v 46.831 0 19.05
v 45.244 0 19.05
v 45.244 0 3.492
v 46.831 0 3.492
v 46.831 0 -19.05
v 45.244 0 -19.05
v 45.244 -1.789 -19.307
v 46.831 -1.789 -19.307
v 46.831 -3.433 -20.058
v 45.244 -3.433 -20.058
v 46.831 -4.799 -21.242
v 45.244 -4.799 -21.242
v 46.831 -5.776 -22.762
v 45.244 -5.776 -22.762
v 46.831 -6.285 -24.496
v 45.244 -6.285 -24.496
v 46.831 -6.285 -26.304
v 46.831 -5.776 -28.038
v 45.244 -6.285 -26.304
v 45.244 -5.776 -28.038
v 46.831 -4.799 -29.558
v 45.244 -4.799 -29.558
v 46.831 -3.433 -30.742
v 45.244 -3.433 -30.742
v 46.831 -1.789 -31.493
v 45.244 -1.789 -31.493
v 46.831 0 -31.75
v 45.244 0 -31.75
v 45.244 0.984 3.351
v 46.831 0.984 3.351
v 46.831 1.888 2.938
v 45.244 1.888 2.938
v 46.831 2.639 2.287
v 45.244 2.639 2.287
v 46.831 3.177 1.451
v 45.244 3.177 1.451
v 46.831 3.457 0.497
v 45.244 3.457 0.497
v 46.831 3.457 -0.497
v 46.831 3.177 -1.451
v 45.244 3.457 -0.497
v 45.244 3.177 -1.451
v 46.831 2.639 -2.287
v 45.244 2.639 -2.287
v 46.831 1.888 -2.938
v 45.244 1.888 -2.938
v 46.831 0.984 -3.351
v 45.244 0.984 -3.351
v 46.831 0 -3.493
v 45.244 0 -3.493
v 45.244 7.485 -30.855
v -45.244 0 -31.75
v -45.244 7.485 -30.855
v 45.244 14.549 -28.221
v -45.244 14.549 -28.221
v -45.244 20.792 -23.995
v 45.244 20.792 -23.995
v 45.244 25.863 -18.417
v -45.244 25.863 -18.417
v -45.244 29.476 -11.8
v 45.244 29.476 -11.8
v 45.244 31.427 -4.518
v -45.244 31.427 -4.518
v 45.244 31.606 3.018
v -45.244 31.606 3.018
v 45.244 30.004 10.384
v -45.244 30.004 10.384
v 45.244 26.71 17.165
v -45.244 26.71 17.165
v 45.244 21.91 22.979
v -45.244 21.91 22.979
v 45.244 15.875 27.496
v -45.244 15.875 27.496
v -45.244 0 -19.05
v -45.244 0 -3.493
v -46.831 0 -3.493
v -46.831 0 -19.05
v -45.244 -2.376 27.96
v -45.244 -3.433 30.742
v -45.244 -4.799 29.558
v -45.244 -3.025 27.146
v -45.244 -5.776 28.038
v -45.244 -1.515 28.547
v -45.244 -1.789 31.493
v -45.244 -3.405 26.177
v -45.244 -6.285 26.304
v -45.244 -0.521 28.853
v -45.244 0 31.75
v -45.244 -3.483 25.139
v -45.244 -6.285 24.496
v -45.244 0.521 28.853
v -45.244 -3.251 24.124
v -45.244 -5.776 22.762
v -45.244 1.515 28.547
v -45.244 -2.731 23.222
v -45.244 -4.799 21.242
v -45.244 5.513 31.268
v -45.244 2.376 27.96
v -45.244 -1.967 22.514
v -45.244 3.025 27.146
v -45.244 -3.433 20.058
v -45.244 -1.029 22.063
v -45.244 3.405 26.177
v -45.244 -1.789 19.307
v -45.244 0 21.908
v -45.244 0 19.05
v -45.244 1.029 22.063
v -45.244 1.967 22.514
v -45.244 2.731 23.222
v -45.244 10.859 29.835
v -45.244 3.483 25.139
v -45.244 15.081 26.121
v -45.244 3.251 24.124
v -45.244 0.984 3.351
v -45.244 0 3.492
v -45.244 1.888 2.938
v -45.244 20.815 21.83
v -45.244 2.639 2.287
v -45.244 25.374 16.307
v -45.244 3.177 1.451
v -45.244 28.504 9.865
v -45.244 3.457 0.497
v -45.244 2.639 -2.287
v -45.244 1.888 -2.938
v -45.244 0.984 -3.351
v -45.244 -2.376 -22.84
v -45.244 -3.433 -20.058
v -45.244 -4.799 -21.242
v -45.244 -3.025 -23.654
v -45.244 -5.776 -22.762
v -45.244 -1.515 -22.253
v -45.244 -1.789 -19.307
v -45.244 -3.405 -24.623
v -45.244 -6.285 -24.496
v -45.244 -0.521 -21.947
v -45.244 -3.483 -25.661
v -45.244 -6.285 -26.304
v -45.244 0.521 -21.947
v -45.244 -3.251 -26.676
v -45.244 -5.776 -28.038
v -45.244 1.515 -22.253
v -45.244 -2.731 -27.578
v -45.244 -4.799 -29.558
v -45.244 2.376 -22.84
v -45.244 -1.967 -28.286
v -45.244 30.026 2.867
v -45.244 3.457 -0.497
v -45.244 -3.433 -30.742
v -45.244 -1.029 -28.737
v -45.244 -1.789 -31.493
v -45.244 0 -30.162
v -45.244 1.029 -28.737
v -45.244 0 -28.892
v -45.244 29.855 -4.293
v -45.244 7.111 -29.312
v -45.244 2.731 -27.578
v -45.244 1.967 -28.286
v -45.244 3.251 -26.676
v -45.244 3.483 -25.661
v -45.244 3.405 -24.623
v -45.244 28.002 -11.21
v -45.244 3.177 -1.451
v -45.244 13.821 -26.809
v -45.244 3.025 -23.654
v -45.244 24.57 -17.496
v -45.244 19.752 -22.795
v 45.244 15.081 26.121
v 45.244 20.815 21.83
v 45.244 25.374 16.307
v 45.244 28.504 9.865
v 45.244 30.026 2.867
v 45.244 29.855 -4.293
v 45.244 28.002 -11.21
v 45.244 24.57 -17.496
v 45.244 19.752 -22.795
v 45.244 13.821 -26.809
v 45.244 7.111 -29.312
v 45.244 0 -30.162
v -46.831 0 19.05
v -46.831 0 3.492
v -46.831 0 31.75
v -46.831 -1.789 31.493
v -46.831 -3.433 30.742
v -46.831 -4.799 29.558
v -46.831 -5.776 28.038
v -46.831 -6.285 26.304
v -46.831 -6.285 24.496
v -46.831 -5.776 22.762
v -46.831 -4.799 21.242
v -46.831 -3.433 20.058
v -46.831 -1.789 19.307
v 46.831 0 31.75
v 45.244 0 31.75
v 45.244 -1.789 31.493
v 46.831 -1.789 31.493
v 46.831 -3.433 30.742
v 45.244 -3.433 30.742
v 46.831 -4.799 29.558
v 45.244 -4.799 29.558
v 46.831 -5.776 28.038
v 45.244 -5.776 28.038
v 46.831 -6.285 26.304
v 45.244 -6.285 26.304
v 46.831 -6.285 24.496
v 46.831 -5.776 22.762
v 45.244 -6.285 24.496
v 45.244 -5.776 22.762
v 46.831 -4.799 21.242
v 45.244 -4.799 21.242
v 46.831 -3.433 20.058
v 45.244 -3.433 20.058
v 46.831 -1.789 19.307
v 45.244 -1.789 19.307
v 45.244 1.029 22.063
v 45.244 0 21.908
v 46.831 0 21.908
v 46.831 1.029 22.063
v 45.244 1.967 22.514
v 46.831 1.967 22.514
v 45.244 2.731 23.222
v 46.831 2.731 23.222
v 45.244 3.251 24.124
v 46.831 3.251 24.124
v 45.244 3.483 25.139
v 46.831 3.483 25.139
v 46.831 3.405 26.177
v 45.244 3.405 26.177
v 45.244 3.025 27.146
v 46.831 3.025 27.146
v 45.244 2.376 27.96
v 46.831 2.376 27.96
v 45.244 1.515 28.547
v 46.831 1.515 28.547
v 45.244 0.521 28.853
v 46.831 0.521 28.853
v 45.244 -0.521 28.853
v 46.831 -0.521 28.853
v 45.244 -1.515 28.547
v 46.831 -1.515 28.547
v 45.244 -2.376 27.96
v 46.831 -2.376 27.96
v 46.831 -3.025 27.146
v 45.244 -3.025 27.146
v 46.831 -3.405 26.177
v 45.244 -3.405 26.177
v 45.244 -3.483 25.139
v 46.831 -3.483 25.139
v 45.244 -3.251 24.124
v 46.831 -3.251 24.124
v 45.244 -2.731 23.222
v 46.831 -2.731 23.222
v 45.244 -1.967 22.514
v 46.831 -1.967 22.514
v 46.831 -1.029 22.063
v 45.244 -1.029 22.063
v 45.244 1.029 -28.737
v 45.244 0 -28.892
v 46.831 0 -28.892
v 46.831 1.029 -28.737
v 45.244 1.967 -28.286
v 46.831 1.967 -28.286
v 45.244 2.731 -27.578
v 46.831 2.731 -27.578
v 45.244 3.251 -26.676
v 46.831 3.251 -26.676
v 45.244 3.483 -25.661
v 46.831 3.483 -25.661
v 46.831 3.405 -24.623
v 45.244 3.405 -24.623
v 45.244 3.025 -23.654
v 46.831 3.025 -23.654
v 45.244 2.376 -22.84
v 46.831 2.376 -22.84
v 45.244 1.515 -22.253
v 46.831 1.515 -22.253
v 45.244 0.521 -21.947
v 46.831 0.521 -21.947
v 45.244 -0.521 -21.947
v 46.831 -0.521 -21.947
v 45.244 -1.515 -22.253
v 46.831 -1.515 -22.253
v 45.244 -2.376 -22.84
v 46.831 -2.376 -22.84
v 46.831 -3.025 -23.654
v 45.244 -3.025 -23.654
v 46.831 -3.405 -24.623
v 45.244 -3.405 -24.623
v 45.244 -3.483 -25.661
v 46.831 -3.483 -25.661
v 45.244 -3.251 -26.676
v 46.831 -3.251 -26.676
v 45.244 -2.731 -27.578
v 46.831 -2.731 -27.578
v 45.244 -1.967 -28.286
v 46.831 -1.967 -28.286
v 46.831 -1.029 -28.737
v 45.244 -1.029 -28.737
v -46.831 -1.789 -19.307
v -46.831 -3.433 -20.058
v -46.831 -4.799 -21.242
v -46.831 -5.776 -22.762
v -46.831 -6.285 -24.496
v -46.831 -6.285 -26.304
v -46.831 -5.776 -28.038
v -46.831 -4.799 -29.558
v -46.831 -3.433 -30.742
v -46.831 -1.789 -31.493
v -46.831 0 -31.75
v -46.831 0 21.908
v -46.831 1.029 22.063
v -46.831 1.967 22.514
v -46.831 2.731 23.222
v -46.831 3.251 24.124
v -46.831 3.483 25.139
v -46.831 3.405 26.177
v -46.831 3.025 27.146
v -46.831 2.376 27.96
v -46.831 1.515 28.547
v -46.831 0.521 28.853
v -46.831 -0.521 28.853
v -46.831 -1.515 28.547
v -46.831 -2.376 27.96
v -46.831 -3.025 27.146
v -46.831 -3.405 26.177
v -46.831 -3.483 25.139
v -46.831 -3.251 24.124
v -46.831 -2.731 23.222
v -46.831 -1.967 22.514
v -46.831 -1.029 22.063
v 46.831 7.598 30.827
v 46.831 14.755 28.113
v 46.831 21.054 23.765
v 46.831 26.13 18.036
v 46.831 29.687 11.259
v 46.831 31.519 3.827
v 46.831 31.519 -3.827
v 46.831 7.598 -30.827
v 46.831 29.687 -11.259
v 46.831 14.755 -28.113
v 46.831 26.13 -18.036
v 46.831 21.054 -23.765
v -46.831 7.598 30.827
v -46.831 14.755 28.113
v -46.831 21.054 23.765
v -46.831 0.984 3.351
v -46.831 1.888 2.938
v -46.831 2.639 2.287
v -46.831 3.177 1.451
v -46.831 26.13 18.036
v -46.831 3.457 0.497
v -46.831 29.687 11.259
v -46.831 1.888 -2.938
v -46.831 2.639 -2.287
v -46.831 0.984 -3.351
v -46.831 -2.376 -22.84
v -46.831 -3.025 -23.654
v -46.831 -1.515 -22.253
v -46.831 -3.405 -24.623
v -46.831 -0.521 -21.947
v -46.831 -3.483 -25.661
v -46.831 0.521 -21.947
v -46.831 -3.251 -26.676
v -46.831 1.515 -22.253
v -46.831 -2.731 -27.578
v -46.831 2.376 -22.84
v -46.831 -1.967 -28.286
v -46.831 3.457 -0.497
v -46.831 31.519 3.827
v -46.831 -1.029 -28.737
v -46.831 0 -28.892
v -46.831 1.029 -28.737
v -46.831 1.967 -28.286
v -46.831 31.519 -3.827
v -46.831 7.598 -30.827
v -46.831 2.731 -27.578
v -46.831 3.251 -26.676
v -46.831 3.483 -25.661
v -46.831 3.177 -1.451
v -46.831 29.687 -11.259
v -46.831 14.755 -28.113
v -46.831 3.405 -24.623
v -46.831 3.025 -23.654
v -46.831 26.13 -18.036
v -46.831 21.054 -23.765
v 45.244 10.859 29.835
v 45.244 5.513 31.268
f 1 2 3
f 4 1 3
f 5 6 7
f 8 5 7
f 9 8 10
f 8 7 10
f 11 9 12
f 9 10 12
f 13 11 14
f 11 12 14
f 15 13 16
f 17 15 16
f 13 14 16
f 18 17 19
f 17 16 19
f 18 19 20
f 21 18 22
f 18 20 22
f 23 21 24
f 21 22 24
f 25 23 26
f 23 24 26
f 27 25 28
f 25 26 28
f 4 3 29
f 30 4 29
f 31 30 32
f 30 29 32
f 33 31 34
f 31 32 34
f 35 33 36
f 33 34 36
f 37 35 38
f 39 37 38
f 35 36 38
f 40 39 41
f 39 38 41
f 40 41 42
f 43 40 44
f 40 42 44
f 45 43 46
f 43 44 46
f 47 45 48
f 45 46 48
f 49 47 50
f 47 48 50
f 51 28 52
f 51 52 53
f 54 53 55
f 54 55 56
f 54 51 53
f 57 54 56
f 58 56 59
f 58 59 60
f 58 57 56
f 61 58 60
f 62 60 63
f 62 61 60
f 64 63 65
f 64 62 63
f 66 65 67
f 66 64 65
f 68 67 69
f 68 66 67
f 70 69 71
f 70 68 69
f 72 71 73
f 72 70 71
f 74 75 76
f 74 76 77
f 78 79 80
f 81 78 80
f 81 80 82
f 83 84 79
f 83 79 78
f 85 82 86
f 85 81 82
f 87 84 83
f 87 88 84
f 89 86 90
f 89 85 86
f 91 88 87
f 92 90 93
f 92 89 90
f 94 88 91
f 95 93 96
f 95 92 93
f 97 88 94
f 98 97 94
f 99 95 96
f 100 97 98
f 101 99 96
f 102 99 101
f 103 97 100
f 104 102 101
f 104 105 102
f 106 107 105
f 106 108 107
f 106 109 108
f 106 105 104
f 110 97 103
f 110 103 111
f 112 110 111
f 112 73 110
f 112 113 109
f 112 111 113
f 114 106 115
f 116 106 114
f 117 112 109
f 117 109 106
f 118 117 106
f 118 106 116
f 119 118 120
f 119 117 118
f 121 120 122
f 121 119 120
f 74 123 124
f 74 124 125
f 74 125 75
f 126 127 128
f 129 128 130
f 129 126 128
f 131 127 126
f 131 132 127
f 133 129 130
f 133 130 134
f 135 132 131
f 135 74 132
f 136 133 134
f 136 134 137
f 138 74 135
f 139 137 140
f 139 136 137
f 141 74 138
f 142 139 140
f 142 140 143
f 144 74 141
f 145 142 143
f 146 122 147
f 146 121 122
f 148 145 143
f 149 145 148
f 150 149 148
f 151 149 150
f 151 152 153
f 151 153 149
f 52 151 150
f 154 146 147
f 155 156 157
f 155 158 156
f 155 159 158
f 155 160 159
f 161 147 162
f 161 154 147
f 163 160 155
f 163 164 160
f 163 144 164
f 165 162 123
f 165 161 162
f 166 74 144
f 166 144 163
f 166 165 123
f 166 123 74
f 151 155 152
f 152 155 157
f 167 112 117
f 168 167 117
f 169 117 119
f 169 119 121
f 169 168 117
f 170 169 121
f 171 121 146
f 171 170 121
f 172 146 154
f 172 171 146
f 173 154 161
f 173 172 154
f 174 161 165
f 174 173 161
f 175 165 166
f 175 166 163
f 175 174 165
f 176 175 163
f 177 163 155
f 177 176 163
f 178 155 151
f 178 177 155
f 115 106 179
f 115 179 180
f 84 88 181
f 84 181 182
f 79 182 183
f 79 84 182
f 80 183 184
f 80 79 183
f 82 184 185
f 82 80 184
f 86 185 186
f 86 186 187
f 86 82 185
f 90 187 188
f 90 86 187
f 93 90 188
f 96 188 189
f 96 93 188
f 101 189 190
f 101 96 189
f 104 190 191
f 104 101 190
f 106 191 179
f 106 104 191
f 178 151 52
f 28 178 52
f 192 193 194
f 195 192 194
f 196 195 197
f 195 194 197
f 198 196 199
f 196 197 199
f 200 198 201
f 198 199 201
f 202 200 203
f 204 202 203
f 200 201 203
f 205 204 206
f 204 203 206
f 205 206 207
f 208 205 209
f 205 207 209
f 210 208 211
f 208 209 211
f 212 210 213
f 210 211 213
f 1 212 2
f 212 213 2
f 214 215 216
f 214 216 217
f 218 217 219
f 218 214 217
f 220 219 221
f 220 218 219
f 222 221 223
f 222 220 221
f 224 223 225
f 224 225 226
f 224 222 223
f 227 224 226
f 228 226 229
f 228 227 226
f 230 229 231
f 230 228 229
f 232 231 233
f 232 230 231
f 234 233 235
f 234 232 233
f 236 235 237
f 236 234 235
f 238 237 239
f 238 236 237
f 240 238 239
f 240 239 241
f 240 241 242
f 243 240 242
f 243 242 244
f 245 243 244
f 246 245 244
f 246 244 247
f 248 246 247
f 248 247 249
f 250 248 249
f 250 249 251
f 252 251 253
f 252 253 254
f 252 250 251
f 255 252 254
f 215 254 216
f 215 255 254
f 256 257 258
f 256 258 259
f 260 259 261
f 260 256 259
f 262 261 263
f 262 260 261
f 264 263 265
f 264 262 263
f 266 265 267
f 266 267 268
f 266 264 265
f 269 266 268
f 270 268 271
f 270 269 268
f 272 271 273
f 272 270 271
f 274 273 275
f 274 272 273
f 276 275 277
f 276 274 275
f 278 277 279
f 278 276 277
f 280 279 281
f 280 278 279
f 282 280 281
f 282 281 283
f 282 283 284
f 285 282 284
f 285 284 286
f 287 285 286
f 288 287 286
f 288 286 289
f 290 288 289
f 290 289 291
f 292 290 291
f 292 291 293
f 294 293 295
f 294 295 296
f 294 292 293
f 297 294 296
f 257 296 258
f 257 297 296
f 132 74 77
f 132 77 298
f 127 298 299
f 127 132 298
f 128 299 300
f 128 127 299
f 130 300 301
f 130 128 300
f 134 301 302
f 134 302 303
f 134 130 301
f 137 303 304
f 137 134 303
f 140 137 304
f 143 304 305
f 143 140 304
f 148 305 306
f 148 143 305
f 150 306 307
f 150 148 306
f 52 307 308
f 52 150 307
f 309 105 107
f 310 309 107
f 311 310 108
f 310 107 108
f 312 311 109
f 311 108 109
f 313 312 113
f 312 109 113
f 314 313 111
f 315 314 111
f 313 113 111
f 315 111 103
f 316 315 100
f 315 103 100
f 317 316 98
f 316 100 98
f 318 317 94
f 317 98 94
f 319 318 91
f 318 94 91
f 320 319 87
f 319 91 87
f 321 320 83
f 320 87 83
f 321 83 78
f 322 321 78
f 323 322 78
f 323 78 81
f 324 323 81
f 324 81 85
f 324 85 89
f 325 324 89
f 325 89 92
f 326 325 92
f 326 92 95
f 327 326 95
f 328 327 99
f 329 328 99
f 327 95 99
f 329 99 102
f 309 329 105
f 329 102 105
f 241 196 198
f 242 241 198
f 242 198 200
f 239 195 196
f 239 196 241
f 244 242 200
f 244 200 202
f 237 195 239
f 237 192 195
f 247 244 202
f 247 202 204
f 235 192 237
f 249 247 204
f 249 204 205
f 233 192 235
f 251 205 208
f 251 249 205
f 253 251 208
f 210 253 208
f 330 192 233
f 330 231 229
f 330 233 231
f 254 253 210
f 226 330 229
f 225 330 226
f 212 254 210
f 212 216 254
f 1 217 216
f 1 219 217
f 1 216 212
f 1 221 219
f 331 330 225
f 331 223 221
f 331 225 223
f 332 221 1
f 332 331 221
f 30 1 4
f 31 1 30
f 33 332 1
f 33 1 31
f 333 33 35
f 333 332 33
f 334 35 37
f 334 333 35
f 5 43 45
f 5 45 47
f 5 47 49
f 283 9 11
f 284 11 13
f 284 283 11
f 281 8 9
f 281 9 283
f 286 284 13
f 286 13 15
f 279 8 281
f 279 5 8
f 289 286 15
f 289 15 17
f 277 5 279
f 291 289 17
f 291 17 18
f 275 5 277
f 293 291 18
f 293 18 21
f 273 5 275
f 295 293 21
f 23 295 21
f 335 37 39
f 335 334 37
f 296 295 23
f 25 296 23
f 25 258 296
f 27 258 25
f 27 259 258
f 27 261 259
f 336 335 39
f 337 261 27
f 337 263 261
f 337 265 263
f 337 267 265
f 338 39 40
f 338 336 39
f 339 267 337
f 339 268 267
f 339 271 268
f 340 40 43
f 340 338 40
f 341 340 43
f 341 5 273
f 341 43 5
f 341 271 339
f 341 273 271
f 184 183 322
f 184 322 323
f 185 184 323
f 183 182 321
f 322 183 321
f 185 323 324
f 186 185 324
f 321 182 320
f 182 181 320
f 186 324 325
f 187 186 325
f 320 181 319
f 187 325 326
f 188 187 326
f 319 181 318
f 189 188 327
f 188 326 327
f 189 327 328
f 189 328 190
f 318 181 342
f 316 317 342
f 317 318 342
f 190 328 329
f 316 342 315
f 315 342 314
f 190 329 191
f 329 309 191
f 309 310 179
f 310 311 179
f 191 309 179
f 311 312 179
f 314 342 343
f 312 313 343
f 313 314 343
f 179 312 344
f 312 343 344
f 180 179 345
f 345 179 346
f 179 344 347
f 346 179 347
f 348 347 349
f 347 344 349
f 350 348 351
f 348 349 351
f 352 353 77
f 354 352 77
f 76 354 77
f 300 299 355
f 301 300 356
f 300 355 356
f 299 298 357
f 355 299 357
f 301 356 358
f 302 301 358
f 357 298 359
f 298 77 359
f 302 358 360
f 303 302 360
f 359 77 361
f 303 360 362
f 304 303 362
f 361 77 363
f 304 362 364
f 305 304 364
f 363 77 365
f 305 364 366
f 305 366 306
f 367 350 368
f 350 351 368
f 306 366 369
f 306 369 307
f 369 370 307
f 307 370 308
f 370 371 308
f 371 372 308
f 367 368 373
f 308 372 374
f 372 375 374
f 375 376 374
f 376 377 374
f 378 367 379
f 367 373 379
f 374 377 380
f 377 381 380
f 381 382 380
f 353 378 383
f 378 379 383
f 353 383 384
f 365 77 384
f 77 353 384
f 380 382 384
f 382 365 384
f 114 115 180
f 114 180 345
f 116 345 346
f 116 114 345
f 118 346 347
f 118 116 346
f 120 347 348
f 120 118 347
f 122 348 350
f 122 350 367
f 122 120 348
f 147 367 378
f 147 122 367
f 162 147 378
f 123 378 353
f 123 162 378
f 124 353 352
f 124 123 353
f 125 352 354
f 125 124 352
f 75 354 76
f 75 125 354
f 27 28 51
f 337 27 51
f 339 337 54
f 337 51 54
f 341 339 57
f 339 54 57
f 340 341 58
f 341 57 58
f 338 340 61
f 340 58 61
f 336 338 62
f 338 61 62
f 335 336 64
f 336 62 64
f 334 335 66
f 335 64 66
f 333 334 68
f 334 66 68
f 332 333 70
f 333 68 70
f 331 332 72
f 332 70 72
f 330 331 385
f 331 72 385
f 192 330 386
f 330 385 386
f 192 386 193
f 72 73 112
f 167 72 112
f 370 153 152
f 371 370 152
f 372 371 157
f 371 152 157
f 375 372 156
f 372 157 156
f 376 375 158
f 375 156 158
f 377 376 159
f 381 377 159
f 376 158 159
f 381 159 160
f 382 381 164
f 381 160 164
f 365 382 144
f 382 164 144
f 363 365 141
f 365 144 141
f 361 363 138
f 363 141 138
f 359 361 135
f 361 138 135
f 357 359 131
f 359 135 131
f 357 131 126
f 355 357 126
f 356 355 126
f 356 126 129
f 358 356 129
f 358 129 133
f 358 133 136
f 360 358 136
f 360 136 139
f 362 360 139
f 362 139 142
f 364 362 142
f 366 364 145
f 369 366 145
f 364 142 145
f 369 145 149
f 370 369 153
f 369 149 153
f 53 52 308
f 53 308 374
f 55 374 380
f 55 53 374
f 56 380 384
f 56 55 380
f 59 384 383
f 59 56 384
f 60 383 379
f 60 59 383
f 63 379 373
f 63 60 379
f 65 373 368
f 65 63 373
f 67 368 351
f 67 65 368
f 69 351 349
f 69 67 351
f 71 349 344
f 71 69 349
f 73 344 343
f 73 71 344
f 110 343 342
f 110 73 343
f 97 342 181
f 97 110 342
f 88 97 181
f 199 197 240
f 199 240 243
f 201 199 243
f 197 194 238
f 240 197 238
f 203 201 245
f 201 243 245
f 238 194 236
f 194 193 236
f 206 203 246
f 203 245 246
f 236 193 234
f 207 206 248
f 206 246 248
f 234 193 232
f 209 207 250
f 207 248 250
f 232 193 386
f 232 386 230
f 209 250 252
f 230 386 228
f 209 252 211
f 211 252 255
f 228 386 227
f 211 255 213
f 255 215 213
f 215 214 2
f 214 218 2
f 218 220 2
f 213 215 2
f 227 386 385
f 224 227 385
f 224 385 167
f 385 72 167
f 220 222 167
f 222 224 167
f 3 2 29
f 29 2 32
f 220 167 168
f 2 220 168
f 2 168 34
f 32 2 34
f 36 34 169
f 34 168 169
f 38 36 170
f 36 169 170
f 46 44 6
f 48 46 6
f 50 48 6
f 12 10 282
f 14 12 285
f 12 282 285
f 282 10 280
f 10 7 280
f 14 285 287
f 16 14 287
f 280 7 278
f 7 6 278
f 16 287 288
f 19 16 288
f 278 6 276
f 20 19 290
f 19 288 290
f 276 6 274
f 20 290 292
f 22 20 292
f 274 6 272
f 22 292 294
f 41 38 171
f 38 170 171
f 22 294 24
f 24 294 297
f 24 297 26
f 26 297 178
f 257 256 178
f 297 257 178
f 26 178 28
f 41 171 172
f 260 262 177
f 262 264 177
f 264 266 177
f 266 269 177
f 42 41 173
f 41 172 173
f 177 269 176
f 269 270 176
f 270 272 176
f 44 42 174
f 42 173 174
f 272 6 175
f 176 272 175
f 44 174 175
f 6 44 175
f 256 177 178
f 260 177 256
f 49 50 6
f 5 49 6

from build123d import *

# Parameters (mm, degrees)
BOSS_EXTRUDE1_DEPTH = 45.24375
SKETCH2_R           = 3.4925
BOSS_EXTRUDE2_DEPTH = 1.5875


with BuildPart() as part:
    # Sketch1 → Boss-Extrude1 (new body, symmetric)
    with BuildSketch(Plane(origin=(0, 0, 0), x_dir=(0, 0, -1), z_dir=(1, 0, 0))):
        with BuildLine():
            ThreePointArc((-26.121491242, 15.08125), (7.806629448, 29.134737735), (30.1625, 0))
            Line((30.1625, 0), (31.75, 0))
            ThreePointArc((31.75, 0), (8.217504682, 30.668144985), (-27.49630657, 15.875))
            Line((-27.49630657, 15.875), (-26.121491242, 15.08125))
        make_face()
    extrude(amount=BOSS_EXTRUDE1_DEPTH, both=True)

    # Sketch2 → Boss-Extrude2 (add)
    with BuildSketch(Plane(origin=(45.24375, 0, 0), x_dir=(0, 0, -1), z_dir=(1, 0, 0))):
        with BuildLine():
            Line((-19.05, 0), (-3.4925, 0))
            ThreePointArc((-3.4925, 0), (0, 3.4925), (3.4925, 0))
            Line((3.4925, 0), (19.05, 0))
            ThreePointArc((19.05, 0), (25.4, -6.35), (31.75, 0))
            ThreePointArc((31.75, 0), (0, 31.75), (-31.75, 0))
            ThreePointArc((-31.75, 0), (-25.4, -6.35), (-19.05, 0))
        make_face()
        with Locations((-25.4, 0)):
            Circle(SKETCH2_R, mode=Mode.SUBTRACT)
        with Locations((25.4, 0)):
            Circle(SKETCH2_R, mode=Mode.SUBTRACT)
    boss_extrude2 = extrude(amount=BOSS_EXTRUDE2_DEPTH)

    # Mirror1: Boss-Extrude2 across plane
    add(boss_extrude2.mirror(Plane(origin=(0, 0, 0), x_dir=(0, 0, 1), z_dir=(1, 0, 0))))


solid = part.part
